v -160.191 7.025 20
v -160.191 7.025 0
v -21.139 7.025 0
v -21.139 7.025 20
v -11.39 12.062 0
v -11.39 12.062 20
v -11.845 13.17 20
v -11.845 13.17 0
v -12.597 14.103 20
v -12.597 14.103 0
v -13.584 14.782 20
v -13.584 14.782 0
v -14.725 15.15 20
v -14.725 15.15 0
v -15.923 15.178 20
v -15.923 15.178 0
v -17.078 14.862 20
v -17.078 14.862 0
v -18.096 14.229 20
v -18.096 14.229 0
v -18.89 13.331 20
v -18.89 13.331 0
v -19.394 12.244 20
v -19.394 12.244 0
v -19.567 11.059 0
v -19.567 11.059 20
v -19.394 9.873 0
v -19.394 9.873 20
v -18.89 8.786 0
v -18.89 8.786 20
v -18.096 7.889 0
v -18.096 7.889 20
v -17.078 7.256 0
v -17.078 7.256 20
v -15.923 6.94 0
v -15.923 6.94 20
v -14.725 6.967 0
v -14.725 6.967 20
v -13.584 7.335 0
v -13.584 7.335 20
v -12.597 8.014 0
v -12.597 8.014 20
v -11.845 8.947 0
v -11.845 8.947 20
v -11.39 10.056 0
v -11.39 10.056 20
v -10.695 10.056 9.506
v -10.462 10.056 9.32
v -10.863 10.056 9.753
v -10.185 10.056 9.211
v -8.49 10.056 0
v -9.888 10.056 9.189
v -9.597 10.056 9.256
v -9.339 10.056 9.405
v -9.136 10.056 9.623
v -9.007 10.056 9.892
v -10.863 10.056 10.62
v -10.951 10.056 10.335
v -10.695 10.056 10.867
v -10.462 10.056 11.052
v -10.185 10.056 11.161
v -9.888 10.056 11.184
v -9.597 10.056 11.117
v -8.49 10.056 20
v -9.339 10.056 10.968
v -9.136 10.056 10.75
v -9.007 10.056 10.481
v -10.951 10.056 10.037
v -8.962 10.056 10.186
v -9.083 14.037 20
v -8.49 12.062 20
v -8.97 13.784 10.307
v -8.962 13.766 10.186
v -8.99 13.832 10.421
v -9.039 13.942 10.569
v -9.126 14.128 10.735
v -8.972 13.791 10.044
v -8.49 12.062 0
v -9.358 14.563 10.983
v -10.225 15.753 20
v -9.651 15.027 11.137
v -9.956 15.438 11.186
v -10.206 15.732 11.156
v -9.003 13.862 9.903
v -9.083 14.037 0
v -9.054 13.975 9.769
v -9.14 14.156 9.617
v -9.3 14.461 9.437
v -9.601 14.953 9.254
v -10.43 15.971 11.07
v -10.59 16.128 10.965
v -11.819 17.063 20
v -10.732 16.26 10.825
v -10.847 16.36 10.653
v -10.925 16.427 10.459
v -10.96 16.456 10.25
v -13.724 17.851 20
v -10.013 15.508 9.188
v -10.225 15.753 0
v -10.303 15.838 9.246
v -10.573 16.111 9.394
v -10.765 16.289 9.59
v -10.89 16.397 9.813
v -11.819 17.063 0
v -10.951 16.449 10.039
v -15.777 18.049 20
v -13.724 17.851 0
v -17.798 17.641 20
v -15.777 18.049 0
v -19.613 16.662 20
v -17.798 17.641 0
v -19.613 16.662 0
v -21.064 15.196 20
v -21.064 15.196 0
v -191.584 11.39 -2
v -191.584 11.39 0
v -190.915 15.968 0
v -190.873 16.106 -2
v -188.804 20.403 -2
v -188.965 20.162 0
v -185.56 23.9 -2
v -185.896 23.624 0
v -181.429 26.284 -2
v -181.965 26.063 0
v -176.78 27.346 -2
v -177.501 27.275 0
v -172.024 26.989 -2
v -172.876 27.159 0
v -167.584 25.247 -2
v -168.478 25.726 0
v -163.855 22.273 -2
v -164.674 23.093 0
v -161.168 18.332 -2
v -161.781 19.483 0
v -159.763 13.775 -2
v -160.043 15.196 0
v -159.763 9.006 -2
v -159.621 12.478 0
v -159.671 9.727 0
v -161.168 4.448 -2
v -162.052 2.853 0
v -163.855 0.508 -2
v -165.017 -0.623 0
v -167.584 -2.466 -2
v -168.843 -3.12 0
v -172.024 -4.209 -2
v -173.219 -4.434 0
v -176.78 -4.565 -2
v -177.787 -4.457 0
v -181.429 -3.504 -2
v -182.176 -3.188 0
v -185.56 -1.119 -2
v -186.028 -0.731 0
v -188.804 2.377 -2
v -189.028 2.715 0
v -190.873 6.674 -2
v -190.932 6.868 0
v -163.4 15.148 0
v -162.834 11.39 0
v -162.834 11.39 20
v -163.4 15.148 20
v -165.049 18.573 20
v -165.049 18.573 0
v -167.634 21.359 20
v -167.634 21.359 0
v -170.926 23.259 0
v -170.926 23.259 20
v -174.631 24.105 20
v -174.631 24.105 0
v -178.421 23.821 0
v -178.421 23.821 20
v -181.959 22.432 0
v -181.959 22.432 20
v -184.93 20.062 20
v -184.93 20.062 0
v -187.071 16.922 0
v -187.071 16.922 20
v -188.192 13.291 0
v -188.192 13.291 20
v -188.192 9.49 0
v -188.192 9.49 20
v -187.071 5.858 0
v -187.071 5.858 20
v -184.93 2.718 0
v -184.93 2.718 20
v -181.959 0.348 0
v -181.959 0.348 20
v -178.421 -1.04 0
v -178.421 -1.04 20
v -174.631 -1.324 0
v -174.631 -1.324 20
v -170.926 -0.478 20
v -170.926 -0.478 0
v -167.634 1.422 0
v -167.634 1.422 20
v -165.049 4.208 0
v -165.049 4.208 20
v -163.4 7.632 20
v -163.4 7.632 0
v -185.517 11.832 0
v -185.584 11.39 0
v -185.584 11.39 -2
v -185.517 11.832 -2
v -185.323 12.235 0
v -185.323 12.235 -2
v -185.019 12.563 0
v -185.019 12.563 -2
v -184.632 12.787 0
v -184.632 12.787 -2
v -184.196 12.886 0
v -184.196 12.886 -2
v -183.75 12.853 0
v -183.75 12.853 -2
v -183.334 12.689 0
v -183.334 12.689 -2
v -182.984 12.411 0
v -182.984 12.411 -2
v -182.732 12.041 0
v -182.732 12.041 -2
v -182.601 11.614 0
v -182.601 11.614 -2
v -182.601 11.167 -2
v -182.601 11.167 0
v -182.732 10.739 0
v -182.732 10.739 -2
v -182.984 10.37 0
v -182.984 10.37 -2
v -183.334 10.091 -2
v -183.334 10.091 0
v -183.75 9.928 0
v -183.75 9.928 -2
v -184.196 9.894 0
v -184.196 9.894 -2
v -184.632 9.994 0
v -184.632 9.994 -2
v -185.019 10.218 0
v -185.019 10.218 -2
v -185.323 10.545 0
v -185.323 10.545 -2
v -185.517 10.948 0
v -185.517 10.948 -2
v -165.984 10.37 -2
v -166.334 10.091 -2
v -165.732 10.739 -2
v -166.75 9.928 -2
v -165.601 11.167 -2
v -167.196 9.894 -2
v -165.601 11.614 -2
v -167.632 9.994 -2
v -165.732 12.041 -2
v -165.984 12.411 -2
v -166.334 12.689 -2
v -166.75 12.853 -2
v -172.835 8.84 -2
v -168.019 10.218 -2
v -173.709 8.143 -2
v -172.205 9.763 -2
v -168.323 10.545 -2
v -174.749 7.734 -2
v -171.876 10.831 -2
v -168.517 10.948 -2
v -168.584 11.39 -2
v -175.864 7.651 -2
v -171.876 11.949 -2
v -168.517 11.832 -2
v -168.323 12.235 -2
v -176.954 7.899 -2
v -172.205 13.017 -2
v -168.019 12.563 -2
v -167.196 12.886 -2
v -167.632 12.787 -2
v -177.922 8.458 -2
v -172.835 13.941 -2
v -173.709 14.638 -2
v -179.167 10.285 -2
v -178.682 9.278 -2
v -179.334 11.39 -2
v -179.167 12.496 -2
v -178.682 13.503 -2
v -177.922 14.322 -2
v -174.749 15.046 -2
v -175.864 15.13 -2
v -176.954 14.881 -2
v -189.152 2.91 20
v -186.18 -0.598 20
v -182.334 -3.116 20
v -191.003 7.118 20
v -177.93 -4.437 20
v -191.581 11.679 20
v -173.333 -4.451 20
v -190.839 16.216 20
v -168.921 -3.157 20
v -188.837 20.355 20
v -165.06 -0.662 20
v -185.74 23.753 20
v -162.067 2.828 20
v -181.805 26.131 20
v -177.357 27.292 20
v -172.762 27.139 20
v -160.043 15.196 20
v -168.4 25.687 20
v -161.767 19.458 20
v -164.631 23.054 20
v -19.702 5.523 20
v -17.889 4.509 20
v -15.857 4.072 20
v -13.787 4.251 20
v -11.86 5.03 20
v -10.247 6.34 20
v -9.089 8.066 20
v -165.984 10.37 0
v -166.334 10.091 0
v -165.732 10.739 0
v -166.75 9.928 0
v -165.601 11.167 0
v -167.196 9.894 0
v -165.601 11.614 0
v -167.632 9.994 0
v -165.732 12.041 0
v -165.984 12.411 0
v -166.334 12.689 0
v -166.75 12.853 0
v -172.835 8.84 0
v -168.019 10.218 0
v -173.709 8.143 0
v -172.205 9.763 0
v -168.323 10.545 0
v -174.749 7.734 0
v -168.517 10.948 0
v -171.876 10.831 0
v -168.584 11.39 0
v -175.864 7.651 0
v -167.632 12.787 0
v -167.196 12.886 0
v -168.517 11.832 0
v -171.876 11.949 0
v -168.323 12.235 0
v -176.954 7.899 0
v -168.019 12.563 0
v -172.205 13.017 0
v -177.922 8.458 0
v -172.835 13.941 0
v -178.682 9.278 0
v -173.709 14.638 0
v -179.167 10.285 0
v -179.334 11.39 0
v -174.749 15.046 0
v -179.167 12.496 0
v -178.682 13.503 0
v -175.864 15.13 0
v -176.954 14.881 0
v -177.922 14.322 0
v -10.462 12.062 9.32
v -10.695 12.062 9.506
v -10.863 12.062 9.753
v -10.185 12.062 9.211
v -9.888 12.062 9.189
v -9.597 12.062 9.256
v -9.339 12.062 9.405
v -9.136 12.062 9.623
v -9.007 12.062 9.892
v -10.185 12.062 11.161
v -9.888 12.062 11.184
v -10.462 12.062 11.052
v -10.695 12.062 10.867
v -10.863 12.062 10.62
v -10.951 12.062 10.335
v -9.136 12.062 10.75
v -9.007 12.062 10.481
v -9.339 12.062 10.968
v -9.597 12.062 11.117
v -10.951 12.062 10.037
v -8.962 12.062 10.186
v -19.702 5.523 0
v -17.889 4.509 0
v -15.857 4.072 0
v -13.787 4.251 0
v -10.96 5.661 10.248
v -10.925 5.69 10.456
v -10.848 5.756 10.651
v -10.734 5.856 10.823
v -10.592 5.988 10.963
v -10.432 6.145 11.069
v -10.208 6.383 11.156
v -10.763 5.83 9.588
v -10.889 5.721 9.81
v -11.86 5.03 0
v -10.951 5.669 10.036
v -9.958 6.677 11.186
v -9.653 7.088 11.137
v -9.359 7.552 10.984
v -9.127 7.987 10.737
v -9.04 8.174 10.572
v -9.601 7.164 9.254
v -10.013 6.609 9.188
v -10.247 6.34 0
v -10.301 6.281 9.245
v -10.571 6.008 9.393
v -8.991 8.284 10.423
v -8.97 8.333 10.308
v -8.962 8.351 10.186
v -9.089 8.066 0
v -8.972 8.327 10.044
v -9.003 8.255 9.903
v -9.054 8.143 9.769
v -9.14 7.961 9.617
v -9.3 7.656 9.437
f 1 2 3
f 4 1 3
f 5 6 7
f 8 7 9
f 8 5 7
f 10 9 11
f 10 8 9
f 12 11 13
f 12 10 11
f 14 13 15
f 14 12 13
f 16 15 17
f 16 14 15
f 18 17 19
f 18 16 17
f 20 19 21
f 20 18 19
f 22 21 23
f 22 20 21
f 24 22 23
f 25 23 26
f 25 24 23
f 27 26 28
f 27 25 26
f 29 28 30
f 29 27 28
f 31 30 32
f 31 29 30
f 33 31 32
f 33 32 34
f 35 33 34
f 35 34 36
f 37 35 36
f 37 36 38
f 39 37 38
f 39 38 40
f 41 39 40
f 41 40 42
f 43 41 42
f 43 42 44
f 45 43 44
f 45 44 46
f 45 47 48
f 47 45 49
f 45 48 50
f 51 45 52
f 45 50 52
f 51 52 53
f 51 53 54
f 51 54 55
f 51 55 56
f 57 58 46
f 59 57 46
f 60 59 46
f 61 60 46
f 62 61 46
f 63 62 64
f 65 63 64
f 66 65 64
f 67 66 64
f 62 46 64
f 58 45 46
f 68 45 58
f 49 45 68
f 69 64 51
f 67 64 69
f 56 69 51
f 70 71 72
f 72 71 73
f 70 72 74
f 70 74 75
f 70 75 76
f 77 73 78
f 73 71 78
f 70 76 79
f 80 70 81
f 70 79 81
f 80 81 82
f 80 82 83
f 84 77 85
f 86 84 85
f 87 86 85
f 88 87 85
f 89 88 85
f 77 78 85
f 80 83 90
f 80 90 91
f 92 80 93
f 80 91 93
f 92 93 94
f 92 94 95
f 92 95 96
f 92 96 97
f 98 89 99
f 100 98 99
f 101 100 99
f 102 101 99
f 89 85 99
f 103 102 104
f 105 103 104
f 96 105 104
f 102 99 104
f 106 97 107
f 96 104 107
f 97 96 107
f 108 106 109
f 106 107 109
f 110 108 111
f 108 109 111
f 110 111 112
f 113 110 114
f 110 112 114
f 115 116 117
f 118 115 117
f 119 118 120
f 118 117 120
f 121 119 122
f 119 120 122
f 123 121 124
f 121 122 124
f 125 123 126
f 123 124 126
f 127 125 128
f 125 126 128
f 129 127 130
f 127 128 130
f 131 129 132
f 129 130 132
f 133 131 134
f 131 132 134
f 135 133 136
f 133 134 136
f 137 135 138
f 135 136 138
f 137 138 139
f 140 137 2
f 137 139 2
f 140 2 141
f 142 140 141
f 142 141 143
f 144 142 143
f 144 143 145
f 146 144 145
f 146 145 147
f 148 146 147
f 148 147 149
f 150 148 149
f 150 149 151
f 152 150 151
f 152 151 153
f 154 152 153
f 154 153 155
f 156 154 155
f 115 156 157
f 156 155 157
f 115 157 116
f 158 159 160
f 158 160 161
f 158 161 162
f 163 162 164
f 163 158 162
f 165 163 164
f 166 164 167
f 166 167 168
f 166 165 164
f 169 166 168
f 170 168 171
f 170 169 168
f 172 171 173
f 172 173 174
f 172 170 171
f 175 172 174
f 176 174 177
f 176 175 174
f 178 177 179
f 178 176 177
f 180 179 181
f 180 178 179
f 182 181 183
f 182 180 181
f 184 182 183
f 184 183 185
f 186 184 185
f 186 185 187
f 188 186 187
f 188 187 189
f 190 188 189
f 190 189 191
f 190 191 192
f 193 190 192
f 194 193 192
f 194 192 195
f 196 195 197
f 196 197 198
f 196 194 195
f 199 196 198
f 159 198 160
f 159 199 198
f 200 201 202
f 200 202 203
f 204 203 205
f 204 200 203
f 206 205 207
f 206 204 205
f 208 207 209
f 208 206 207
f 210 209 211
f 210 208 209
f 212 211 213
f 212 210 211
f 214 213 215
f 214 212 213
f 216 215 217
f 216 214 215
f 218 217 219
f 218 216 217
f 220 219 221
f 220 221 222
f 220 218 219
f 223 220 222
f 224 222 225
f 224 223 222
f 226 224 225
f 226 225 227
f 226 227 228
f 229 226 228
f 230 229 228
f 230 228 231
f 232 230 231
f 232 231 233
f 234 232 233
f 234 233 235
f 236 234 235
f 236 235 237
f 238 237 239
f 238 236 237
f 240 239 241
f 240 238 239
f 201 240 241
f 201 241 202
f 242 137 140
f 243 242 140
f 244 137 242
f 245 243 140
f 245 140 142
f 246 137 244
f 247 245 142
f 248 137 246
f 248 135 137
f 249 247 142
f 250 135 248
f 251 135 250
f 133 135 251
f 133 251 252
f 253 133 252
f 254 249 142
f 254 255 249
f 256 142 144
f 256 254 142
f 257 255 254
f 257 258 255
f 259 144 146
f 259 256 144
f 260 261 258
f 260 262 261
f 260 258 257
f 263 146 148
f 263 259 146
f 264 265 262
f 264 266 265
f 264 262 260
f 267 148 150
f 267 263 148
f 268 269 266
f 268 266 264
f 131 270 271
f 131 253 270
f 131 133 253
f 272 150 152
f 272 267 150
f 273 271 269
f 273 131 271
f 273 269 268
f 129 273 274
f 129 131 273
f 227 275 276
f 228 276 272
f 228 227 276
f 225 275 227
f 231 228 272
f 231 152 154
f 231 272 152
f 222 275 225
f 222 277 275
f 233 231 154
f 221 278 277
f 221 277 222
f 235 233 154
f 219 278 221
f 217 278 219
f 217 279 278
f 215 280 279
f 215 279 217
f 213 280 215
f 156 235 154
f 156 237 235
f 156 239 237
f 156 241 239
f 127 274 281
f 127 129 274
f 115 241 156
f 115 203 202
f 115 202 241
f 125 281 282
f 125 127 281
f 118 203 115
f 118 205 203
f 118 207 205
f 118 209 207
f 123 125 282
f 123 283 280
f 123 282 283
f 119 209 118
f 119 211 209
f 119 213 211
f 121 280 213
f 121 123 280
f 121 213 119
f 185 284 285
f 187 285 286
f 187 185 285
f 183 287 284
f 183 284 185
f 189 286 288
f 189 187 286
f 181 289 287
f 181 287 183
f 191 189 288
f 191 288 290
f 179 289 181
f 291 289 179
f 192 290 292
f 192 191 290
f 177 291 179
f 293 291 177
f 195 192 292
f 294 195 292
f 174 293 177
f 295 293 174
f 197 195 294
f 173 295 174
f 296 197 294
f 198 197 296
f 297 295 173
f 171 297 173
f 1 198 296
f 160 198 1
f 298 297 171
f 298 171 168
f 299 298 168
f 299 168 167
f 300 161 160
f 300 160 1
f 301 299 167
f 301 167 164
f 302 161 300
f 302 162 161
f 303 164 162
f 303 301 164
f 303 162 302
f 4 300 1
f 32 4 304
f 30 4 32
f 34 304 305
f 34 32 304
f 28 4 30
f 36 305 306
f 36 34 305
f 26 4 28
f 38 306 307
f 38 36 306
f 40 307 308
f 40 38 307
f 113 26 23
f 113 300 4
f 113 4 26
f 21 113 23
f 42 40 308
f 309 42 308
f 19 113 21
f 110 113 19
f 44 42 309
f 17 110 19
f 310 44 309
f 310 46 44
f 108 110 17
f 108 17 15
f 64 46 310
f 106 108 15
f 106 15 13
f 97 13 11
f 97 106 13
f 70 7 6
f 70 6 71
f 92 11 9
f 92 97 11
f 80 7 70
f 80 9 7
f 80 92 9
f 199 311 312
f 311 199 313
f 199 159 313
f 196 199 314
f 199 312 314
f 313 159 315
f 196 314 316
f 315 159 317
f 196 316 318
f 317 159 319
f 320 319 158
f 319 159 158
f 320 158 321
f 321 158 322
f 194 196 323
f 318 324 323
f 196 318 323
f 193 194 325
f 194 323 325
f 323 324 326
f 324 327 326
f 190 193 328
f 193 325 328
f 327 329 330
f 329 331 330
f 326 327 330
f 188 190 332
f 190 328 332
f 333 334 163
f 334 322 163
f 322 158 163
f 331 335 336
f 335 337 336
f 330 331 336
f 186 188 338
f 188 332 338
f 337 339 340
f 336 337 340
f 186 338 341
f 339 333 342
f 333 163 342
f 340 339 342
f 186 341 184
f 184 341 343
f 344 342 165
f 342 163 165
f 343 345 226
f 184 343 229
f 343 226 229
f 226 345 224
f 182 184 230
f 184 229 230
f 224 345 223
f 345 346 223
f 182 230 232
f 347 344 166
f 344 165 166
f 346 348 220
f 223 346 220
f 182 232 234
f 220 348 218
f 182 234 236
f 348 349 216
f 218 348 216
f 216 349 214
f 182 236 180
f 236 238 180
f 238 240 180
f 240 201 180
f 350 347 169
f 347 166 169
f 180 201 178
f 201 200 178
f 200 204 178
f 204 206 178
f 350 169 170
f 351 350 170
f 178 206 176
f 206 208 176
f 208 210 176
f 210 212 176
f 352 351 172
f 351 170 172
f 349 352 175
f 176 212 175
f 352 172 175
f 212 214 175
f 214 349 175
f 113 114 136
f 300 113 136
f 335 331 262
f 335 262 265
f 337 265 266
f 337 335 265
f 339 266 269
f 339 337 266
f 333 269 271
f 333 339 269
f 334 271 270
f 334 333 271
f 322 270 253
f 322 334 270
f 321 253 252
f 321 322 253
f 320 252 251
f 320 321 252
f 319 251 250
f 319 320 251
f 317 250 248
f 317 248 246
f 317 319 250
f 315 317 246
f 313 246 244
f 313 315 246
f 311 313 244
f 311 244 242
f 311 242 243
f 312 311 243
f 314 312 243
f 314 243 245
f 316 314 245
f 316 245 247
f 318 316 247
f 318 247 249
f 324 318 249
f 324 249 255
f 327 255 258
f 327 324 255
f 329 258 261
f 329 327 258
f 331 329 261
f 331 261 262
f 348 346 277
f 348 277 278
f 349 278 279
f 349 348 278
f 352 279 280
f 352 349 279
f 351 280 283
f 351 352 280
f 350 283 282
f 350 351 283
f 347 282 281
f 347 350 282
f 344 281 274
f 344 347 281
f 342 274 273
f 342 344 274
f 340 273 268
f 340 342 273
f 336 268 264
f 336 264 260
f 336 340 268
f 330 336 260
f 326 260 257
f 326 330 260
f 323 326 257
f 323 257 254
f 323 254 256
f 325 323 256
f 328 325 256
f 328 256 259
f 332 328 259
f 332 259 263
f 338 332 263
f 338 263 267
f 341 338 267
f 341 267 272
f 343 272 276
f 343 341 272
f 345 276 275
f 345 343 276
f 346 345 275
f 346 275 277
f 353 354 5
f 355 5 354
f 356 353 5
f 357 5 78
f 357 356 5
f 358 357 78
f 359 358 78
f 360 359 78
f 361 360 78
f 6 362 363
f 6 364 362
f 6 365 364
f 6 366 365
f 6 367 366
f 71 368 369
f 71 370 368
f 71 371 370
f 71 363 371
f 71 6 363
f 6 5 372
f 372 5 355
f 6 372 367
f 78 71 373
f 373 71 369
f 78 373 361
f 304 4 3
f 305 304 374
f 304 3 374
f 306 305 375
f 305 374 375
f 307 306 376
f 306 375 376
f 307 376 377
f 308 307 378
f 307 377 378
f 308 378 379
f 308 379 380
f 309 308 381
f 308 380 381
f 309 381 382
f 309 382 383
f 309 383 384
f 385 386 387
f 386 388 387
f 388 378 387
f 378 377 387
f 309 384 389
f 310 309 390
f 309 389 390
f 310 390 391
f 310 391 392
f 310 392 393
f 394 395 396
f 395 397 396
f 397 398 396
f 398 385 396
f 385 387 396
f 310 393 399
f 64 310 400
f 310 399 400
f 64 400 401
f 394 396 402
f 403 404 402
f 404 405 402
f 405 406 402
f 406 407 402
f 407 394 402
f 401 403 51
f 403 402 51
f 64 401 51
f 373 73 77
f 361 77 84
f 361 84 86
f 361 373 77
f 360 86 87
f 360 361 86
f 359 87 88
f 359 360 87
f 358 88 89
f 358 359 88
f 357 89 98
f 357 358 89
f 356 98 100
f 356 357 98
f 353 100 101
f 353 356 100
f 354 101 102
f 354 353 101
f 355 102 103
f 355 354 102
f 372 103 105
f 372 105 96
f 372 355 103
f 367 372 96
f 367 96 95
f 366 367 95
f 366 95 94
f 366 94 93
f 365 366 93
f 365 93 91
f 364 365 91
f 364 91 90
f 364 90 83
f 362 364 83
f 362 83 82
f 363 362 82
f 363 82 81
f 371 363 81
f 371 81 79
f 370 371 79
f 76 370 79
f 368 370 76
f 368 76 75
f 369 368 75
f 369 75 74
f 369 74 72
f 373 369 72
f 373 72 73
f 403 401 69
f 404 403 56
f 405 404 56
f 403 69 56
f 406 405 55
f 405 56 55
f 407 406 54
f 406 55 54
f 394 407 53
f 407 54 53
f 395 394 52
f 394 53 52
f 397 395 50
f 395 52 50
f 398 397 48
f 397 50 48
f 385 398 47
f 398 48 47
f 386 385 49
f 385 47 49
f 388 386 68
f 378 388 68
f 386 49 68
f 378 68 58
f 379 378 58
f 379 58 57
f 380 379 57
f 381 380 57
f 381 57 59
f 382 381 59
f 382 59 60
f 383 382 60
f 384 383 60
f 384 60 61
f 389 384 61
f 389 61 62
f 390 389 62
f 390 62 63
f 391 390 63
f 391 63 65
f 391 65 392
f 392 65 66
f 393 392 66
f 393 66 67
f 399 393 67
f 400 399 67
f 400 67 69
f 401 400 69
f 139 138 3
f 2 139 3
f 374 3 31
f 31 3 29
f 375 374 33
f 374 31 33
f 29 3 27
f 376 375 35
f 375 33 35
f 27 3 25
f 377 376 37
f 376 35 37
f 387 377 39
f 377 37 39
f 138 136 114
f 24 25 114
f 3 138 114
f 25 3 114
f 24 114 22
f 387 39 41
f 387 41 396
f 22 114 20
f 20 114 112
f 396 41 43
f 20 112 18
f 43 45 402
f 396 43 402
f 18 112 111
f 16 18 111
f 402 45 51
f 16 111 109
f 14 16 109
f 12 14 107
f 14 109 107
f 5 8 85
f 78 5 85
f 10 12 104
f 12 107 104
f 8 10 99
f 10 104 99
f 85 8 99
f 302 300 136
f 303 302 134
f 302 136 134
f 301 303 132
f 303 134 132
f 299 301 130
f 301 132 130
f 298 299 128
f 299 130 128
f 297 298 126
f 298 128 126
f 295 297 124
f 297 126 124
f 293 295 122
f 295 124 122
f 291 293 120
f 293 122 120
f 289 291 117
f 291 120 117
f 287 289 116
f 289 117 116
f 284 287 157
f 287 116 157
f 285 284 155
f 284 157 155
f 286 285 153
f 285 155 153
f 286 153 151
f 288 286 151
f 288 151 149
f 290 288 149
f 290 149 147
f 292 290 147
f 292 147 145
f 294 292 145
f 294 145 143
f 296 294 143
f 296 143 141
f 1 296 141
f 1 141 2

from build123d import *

# Parameters (mm, degrees)
SKETCH1_R               = 4.15
SKETCH1_R_2             = 12.75
BOSS_EXTRUDE1_DEPTH     = 20
SKETCH2_R               = 16
SKETCH2_R_2             = 3.75
SKETCH2_R_3             = 1.5
BOSS_EXTRUDE2_DEPTH     = 2
SKETCH3_W               = 5.093214229
SKETCH3_H               = 2.005927174
CUT_EXTRUDE1_DEPTH      = 23
SKETCH5_R               = 1
CUT_EXTRUDE2_DEPTH      = 18.334595307
CUT_EXTRUDE2_DEPTH_BACK = 15.665404693


with BuildPart() as part:
    # Sketch1 → Boss-Extrude1 (new body)
    with BuildSketch(Plane.XY):
        with BuildLine():
            Line((-160.190785915, 7.025436305), (-21.138691228, 7.025436305))
            ThreePointArc((-21.138691228, 7.025436305), (-8.417687759, 10.994498434), (-21.063816819, 15.196022353))
            Line((-21.063816819, 15.196022353), (-160.043113059, 15.196022353))
            ThreePointArc((-160.043113059, 15.196022353), (-191.581294649, 11.679406985), (-160.190785915, 7.025436305))
        make_face()
        with Locations((-15.417393858, 11.05864302)):
            Circle(SKETCH1_R, mode=Mode.SUBTRACT)
        with Locations((-175.583907283, 11.39027474)):
            Circle(SKETCH1_R_2, mode=Mode.SUBTRACT)
    extrude(amount=BOSS_EXTRUDE1_DEPTH)

    # Sketch2 → Boss-Extrude2 (add)
    with BuildSketch(Plane(origin=(0, 0, 0), x_dir=(-1, 0, 0), z_dir=(0, 0, -1))):
        with Locations((175.583907283, 11.39027474)):
            Circle(SKETCH2_R)
        with Locations((175.583907283, 11.39027474)):
            Circle(SKETCH2_R_2, mode=Mode.SUBTRACT)
        with Locations((184.083907283, 11.39027474)):
            Circle(SKETCH2_R_3, mode=Mode.SUBTRACT)
        with Locations((167.083907283, 11.39027474)):
            Circle(SKETCH2_R_3, mode=Mode.SUBTRACT)
    extrude(amount=BOSS_EXTRUDE2_DEPTH)

    # Sketch3 → Cut-Extrude1 (cut, through all)
    with BuildSketch(Plane.XY.offset(20)):
        with Locations((-9.977016533, 11.05864302)):
            Rectangle(SKETCH3_W, SKETCH3_H)
    extrude(amount=-CUT_EXTRUDE1_DEPTH, mode=Mode.SUBTRACT)

    # Sketch5 → Cut-Extrude2 (cut, two sides)
    with BuildSketch(Plane(origin=(0, 10.055679433, 0), x_dir=(1, 0, 0), z_dir=(0, 1, 0))) as cut_extrude2_sk:
        with Locations((-9.962338035, -10.18638419)):
            Circle(SKETCH5_R)
    extrude(amount=CUT_EXTRUDE2_DEPTH, mode=Mode.SUBTRACT)
    extrude(cut_extrude2_sk.sketch, amount=-CUT_EXTRUDE2_DEPTH_BACK, mode=Mode.SUBTRACT)


solid = part.part
